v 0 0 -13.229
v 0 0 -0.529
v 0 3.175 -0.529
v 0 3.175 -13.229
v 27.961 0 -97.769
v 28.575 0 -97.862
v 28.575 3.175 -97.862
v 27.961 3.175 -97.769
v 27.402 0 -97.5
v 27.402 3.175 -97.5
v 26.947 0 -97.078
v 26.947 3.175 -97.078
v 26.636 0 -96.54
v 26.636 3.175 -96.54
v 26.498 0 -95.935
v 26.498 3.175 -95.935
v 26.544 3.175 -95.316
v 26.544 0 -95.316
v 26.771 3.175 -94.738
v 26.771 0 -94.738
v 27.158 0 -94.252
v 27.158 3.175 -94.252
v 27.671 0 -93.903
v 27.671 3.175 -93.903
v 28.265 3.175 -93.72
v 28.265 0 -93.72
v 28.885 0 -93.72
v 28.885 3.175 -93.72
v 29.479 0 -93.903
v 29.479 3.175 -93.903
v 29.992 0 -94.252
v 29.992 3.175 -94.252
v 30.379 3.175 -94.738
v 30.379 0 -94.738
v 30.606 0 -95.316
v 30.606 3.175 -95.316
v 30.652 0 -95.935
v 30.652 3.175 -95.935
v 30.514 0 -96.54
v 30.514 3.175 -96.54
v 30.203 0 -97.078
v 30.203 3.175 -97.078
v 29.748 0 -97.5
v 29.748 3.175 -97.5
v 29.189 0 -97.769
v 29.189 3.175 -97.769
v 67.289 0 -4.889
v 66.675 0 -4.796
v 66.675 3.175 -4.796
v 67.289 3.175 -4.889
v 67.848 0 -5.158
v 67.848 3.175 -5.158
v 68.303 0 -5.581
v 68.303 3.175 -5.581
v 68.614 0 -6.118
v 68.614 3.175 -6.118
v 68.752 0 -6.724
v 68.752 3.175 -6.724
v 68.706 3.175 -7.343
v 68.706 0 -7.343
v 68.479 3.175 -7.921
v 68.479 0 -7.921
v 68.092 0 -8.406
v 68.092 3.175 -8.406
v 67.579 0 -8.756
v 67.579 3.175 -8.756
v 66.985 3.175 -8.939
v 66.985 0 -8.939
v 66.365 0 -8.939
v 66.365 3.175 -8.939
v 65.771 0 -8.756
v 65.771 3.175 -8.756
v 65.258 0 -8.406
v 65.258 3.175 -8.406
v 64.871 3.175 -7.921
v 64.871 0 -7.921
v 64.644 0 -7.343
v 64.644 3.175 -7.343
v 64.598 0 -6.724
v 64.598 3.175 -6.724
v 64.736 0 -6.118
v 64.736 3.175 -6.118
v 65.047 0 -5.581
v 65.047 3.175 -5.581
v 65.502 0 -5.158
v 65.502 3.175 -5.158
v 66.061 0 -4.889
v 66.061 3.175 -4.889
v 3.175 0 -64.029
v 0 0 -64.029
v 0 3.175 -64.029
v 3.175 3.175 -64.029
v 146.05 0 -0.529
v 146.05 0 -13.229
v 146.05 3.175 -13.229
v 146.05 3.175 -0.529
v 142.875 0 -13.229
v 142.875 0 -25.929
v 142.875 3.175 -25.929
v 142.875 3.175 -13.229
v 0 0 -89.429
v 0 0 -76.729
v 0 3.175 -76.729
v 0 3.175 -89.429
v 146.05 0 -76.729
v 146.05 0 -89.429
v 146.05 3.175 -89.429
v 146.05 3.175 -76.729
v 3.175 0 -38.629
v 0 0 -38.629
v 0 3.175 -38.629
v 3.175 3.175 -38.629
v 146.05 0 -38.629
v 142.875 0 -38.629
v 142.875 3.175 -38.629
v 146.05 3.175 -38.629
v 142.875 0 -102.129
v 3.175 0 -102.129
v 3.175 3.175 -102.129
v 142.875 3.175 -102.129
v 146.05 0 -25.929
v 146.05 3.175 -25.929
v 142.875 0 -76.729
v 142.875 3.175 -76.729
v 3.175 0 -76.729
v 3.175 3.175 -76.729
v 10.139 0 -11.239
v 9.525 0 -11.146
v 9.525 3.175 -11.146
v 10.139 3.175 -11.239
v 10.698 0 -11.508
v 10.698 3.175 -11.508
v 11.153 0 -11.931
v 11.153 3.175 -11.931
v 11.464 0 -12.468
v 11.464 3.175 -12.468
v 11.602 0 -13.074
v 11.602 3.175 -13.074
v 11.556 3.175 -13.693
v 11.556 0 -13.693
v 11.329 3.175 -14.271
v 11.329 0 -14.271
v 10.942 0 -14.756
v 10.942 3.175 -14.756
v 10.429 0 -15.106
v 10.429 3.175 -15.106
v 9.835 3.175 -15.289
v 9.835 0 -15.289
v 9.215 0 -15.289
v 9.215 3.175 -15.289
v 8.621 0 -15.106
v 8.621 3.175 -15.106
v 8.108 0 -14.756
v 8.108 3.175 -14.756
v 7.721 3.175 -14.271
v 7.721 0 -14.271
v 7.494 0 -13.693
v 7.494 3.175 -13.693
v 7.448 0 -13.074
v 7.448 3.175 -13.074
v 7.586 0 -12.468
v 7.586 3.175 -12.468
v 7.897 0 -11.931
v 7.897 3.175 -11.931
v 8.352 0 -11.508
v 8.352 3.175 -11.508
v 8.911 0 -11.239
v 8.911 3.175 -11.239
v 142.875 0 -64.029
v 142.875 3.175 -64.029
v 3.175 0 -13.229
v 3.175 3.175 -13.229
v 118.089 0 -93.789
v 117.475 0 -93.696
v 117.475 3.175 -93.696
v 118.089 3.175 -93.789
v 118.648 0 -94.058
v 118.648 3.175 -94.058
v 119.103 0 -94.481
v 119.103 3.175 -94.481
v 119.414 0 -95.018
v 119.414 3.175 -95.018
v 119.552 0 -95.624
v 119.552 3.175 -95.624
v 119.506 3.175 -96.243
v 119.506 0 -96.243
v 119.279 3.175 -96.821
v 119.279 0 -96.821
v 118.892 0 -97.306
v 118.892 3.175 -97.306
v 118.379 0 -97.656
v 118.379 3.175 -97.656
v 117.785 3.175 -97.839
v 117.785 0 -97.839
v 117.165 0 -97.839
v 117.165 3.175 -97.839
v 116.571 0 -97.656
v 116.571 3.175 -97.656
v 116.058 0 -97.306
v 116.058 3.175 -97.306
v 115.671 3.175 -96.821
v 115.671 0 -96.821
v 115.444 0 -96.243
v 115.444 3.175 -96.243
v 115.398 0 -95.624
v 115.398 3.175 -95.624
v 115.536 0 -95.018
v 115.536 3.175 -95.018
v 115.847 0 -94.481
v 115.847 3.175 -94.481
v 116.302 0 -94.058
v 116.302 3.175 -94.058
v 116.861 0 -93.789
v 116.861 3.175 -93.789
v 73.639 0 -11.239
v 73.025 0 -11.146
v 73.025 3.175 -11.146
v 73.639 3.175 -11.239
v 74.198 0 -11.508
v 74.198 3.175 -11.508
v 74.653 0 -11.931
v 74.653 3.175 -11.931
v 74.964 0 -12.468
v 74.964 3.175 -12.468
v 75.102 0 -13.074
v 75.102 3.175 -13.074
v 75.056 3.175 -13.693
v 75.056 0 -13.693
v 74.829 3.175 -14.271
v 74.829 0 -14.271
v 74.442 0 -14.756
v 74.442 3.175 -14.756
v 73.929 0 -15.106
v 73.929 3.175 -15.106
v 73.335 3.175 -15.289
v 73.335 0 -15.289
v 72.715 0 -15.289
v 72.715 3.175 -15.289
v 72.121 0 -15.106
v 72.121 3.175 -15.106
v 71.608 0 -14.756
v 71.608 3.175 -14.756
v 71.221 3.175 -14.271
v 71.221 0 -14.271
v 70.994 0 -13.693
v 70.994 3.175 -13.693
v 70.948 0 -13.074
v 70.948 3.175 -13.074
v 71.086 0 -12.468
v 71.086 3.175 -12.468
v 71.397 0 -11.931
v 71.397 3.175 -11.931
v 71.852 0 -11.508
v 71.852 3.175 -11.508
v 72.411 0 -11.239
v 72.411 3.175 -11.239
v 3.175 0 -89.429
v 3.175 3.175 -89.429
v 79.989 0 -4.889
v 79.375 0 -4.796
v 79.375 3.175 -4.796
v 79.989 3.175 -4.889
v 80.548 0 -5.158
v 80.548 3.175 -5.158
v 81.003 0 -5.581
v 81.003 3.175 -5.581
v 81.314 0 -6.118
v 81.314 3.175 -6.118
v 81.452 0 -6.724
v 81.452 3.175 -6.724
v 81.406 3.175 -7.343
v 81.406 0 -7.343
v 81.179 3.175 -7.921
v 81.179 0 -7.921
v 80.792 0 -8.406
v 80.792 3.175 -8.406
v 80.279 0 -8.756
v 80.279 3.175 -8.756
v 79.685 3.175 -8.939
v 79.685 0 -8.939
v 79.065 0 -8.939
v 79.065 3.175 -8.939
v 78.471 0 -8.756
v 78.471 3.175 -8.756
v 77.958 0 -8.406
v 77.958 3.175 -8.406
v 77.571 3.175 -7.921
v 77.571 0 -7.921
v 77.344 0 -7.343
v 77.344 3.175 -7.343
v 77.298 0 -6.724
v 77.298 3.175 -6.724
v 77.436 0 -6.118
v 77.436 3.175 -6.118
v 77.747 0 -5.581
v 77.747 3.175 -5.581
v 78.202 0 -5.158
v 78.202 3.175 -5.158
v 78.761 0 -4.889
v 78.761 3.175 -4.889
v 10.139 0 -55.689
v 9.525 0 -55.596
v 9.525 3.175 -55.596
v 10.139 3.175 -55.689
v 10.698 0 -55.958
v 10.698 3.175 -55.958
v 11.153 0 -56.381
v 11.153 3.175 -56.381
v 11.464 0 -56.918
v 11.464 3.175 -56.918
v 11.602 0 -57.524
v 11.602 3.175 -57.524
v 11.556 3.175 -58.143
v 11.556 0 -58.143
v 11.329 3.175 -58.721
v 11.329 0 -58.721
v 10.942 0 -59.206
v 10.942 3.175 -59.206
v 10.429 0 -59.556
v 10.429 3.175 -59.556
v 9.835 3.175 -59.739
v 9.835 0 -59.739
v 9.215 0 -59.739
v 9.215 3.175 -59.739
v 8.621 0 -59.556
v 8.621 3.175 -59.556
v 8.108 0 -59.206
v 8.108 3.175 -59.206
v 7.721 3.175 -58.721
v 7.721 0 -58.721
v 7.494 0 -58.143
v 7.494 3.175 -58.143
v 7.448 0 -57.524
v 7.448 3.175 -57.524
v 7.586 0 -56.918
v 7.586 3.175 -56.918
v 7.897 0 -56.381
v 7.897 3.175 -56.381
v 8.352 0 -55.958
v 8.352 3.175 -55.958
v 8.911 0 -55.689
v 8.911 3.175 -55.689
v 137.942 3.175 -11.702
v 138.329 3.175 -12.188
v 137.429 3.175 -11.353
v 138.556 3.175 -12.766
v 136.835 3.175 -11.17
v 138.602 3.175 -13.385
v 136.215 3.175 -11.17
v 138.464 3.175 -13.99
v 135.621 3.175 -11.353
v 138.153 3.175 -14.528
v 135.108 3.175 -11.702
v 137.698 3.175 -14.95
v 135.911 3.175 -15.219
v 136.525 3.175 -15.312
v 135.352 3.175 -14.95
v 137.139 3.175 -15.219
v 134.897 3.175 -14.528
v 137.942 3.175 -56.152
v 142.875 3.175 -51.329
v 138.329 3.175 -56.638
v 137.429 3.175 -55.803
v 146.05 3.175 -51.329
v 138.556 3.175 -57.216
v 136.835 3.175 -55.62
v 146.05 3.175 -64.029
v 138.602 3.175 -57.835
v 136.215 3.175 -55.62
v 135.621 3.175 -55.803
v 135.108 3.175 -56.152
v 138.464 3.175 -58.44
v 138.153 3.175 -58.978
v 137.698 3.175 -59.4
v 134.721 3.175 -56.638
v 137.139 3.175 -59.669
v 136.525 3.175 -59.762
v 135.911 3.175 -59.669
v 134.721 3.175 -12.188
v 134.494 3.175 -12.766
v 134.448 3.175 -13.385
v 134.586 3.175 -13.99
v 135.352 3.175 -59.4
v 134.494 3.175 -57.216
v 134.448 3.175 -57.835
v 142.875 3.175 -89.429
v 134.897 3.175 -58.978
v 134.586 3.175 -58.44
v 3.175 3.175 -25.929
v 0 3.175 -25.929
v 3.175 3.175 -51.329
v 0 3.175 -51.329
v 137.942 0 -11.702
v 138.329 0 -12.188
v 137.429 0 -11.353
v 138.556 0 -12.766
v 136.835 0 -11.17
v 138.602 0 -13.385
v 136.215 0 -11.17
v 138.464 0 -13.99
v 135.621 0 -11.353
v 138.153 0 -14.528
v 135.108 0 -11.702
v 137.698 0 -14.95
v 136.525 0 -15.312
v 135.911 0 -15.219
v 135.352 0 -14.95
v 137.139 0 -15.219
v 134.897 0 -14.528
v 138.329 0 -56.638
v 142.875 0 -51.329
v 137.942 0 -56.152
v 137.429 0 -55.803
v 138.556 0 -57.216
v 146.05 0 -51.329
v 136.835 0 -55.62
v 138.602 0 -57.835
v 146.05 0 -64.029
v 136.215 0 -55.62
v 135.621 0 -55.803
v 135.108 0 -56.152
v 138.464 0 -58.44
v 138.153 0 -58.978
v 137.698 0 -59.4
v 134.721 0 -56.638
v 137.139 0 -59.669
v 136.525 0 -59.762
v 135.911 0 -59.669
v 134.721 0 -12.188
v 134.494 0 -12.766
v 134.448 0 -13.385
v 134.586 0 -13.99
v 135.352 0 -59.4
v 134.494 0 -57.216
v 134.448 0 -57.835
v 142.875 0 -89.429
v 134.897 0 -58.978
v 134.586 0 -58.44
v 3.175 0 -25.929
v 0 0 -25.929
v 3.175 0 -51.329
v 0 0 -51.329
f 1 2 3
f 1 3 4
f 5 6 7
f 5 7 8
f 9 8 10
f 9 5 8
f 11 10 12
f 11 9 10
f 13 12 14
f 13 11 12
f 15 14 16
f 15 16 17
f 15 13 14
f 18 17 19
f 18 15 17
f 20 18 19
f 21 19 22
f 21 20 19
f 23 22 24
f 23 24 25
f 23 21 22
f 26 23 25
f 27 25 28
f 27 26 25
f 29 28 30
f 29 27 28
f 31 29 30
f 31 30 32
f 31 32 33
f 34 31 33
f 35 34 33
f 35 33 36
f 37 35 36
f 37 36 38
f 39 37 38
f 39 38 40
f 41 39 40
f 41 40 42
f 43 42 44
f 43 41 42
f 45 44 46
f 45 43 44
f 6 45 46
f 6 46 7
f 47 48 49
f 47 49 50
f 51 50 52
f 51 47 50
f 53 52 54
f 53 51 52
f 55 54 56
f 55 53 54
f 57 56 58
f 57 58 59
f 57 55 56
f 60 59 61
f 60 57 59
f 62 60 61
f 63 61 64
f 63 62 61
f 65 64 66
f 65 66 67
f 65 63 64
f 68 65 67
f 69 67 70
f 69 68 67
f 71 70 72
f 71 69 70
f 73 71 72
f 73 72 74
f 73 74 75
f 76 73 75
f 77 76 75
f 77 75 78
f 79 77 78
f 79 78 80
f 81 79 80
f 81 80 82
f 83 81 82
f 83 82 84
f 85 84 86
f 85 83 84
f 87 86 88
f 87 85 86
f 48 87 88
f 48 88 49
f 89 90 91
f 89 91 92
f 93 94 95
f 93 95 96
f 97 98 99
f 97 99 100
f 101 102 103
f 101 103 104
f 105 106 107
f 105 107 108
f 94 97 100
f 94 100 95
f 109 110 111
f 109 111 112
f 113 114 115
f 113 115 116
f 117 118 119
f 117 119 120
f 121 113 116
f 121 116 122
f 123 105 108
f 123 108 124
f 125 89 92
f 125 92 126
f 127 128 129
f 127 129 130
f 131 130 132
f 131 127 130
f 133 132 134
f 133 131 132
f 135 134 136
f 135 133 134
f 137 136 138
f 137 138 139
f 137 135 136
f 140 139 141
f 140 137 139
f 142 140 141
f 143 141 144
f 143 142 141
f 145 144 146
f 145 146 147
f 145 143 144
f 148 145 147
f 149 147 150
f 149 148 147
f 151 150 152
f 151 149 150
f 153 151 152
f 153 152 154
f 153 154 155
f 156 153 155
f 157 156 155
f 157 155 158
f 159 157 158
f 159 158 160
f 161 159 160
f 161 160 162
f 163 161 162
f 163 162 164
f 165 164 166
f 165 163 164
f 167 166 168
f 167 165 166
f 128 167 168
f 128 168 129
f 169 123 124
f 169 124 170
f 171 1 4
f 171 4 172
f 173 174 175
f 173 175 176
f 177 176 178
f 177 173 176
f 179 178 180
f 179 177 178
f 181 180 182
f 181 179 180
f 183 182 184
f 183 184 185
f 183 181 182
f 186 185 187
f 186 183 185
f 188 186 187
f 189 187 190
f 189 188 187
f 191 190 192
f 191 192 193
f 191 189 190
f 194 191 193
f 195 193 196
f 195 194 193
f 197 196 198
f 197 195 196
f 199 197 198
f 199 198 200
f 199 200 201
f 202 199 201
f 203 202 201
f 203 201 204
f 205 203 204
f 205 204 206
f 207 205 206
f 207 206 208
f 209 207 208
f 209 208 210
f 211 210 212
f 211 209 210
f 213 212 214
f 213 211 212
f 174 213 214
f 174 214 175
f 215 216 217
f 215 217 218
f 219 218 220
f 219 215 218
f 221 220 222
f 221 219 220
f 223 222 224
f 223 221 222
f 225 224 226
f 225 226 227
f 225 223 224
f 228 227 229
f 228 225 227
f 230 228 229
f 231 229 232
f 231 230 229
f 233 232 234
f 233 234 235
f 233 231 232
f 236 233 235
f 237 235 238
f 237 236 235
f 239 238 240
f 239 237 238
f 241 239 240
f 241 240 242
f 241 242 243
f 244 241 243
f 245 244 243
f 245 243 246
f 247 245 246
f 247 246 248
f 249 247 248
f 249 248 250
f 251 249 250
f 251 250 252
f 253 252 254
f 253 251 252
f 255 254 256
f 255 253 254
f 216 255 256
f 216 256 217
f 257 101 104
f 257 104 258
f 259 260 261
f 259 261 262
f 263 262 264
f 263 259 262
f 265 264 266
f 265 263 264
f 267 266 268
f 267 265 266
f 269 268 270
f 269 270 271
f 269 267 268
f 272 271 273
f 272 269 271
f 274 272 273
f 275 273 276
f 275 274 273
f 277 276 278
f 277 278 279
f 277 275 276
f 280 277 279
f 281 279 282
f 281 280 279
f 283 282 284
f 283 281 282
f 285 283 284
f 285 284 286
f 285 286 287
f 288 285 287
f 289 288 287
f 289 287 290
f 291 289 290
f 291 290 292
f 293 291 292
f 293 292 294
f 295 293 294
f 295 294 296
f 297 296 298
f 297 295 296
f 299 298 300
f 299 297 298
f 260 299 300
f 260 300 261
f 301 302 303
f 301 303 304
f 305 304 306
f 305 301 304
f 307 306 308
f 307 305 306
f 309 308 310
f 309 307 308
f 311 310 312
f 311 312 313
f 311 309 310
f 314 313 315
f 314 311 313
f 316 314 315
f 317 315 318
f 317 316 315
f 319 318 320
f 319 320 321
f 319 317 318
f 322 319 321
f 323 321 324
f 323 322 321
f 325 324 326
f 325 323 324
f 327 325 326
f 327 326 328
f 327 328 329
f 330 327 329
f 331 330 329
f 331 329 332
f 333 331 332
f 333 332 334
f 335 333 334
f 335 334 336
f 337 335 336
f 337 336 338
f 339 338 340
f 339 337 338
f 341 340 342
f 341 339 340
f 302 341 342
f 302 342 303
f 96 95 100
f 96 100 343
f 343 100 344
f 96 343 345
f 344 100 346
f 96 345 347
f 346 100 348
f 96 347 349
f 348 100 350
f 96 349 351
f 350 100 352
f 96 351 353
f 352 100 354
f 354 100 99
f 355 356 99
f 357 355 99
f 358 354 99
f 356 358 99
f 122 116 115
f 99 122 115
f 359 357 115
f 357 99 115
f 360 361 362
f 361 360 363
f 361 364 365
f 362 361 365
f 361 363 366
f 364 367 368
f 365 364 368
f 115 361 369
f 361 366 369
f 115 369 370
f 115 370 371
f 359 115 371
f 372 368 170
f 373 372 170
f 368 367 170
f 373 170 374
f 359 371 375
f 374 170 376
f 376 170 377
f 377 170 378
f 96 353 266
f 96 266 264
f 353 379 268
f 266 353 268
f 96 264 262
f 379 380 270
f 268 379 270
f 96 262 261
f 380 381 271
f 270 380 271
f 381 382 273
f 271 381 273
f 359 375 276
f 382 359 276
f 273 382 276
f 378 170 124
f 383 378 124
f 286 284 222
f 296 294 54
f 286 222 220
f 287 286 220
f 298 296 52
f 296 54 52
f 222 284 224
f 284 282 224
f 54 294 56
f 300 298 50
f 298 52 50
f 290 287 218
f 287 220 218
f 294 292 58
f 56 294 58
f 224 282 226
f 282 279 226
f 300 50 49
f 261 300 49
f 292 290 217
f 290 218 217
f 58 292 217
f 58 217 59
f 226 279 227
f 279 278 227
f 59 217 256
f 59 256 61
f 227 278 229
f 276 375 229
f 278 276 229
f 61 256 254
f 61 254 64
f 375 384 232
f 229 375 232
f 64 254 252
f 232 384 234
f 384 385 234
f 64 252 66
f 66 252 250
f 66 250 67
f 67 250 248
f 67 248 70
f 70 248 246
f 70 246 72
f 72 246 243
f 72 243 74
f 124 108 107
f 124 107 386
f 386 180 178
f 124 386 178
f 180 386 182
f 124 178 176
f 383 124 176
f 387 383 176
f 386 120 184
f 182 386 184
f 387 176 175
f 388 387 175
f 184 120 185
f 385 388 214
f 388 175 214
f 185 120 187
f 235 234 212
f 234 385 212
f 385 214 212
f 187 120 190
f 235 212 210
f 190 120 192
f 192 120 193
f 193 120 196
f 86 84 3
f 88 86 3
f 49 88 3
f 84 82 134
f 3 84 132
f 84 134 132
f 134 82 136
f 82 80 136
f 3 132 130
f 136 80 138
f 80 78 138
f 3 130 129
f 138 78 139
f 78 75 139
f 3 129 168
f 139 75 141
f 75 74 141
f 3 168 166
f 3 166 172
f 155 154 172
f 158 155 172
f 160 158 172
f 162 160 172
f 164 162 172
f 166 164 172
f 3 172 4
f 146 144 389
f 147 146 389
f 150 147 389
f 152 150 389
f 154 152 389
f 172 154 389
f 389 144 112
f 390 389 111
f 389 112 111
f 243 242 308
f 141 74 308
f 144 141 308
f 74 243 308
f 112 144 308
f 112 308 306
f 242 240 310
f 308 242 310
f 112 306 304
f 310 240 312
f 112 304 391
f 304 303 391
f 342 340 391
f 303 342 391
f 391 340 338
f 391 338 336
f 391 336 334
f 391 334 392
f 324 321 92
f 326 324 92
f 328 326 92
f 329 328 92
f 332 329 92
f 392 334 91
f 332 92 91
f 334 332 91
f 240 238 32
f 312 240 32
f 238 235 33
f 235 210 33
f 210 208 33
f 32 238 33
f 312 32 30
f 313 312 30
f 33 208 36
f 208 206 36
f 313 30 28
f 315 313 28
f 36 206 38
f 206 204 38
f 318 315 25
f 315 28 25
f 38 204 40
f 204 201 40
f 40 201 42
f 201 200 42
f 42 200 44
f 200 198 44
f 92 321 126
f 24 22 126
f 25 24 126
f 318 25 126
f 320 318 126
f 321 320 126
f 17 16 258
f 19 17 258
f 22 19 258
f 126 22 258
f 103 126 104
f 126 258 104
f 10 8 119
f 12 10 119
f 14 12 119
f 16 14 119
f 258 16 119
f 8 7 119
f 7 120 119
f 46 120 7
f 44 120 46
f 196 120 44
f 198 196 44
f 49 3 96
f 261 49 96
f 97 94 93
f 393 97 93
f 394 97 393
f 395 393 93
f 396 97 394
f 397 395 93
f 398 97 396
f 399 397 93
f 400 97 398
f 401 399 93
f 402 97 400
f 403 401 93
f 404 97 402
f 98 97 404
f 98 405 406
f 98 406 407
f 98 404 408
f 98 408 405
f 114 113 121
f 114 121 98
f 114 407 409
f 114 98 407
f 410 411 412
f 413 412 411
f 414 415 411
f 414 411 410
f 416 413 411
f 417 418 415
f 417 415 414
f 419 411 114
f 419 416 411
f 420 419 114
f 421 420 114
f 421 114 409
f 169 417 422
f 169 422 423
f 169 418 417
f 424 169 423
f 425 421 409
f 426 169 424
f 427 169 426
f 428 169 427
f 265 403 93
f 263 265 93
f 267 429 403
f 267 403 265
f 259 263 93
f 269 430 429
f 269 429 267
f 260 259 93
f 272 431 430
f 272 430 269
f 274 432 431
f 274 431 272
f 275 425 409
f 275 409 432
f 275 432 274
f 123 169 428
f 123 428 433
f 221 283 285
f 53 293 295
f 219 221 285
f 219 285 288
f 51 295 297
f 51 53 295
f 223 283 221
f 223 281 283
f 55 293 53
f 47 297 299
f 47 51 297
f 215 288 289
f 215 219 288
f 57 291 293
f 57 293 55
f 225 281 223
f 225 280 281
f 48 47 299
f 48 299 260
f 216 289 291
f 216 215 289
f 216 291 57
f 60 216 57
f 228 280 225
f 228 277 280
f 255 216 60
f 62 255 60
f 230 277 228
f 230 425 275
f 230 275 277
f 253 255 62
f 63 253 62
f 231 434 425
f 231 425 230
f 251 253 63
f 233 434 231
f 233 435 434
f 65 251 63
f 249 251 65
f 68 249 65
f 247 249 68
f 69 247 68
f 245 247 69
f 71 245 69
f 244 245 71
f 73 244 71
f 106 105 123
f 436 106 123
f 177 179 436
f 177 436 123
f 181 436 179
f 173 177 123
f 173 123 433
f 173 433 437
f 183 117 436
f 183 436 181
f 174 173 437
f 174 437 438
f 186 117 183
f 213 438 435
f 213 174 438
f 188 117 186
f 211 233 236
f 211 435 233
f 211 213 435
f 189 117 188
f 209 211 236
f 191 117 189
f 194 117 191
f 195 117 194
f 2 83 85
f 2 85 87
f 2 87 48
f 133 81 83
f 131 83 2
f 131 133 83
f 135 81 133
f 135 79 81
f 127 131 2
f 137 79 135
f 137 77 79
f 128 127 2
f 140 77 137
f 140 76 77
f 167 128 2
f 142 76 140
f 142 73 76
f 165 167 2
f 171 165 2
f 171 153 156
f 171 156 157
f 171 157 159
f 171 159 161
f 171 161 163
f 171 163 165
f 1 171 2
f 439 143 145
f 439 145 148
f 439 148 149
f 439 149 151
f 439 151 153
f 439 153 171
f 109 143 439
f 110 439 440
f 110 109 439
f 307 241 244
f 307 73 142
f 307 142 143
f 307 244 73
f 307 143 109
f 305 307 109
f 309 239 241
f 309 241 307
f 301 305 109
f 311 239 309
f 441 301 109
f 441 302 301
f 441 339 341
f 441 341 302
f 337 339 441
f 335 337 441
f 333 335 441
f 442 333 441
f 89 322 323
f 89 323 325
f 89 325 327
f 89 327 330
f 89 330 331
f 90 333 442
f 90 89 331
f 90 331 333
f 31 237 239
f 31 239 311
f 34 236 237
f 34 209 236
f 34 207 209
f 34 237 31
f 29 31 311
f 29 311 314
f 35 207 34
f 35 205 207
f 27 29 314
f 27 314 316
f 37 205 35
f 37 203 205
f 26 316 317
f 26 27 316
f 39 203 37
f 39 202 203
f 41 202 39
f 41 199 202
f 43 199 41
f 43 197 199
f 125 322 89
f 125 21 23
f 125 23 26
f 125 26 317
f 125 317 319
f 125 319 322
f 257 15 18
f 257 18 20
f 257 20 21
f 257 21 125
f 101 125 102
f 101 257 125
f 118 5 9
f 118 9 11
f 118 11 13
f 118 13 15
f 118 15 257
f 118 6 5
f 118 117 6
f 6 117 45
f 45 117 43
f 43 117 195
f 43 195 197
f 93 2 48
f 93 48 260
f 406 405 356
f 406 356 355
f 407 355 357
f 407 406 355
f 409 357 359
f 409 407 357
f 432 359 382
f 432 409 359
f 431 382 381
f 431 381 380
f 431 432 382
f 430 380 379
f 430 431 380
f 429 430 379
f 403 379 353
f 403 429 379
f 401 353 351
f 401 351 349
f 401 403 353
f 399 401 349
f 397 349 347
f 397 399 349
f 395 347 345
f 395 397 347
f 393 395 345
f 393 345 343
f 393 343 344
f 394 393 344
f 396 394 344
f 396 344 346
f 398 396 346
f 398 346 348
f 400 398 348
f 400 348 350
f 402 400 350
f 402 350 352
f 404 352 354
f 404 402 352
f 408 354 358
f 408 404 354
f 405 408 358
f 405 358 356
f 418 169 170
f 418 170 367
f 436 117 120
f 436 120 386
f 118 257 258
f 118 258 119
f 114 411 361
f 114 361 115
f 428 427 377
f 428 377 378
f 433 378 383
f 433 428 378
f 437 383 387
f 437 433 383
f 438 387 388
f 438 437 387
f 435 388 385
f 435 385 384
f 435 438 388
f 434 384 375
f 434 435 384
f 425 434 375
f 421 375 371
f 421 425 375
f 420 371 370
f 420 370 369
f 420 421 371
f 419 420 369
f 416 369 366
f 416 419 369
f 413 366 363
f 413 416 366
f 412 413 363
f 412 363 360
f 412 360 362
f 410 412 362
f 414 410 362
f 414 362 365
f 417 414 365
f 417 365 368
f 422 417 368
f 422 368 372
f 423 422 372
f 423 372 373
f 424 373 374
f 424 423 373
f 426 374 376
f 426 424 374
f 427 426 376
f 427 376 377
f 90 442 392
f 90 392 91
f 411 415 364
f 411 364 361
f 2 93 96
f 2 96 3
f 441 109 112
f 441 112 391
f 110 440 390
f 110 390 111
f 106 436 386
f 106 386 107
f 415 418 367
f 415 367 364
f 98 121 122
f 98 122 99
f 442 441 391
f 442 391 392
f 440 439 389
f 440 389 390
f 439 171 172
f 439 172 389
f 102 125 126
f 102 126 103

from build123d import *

# Parameters (mm, degrees)
SKETCH2_R           = 2.0828
BOSS_EXTRUDE1_DEPTH = 3.175


with BuildPart() as part:
    # Sketch2 → Boss-Extrude1 (new body)
    with BuildSketch(Plane(origin=(0, 0, 0), x_dir=(1, 0, 0), z_dir=(0, 1, 0))):
        Polygon((3.175, 13.229166667), (3.175, 25.929166667), (0, 25.929166667), (0, 38.629166667), (3.175, 38.629166667), (3.175, 51.329166667), (0, 51.329166667), (0, 64.029166667), (3.175, 64.029166667), (3.175, 76.729166667), (0, 76.729166667), (0, 89.429166667), (3.175, 89.429166667), (3.175, 102.129166667), (142.875, 102.129166667), (142.875, 89.429166667), (146.05, 89.429166667), (146.05, 76.729166667), (142.875, 76.729166667), (142.875, 64.029166667), (146.05, 64.029166667), (146.05, 51.329166667), (142.875, 51.329166667), (142.875, 38.629166667), (146.05, 38.629166667), (146.05, 25.929166667), (142.875, 25.929166667), (142.875, 13.229166667), (146.05, 13.229166667), (146.05, 0.529166667), (0, 0.529166667), (0, 13.229166667), align=None)
        with Locations(Location((136.525, 57.679166667, 0), (0, 0, 90))):
            Circle(SKETCH2_R, mode=Mode.SUBTRACT)
        with Locations(Location((9.525, 13.229166667, 0), (0, 0, 270))):
            Circle(SKETCH2_R, mode=Mode.SUBTRACT)
        with Locations(Location((9.525, 57.679166667, 0), (0, 0, 270))):
            Circle(SKETCH2_R, mode=Mode.SUBTRACT)
        with Locations(Location((136.525, 13.229166667, 0), (0, 0, 90))):
            Circle(SKETCH2_R, mode=Mode.SUBTRACT)
        with Locations(Location((79.375, 6.879166667, 0), (0, 0, 270))):
            Circle(SKETCH2_R, mode=Mode.SUBTRACT)
        with Locations(Location((73.025, 13.229166667, 0), (0, 0, 270))):
            Circle(SKETCH2_R, mode=Mode.SUBTRACT)
        with Locations(Location((66.675, 6.879166667, 0), (0, 0, 270))):
            Circle(SKETCH2_R, mode=Mode.SUBTRACT)
        with Locations(Location((117.475, 95.779166667, 0), (0, 0, 270))):
            Circle(SKETCH2_R, mode=Mode.SUBTRACT)
        with Locations(Location((28.575, 95.779166667, 0), (0, 0, 90))):
            Circle(SKETCH2_R, mode=Mode.SUBTRACT)
    extrude(amount=BOSS_EXTRUDE1_DEPTH)


solid = part.part
